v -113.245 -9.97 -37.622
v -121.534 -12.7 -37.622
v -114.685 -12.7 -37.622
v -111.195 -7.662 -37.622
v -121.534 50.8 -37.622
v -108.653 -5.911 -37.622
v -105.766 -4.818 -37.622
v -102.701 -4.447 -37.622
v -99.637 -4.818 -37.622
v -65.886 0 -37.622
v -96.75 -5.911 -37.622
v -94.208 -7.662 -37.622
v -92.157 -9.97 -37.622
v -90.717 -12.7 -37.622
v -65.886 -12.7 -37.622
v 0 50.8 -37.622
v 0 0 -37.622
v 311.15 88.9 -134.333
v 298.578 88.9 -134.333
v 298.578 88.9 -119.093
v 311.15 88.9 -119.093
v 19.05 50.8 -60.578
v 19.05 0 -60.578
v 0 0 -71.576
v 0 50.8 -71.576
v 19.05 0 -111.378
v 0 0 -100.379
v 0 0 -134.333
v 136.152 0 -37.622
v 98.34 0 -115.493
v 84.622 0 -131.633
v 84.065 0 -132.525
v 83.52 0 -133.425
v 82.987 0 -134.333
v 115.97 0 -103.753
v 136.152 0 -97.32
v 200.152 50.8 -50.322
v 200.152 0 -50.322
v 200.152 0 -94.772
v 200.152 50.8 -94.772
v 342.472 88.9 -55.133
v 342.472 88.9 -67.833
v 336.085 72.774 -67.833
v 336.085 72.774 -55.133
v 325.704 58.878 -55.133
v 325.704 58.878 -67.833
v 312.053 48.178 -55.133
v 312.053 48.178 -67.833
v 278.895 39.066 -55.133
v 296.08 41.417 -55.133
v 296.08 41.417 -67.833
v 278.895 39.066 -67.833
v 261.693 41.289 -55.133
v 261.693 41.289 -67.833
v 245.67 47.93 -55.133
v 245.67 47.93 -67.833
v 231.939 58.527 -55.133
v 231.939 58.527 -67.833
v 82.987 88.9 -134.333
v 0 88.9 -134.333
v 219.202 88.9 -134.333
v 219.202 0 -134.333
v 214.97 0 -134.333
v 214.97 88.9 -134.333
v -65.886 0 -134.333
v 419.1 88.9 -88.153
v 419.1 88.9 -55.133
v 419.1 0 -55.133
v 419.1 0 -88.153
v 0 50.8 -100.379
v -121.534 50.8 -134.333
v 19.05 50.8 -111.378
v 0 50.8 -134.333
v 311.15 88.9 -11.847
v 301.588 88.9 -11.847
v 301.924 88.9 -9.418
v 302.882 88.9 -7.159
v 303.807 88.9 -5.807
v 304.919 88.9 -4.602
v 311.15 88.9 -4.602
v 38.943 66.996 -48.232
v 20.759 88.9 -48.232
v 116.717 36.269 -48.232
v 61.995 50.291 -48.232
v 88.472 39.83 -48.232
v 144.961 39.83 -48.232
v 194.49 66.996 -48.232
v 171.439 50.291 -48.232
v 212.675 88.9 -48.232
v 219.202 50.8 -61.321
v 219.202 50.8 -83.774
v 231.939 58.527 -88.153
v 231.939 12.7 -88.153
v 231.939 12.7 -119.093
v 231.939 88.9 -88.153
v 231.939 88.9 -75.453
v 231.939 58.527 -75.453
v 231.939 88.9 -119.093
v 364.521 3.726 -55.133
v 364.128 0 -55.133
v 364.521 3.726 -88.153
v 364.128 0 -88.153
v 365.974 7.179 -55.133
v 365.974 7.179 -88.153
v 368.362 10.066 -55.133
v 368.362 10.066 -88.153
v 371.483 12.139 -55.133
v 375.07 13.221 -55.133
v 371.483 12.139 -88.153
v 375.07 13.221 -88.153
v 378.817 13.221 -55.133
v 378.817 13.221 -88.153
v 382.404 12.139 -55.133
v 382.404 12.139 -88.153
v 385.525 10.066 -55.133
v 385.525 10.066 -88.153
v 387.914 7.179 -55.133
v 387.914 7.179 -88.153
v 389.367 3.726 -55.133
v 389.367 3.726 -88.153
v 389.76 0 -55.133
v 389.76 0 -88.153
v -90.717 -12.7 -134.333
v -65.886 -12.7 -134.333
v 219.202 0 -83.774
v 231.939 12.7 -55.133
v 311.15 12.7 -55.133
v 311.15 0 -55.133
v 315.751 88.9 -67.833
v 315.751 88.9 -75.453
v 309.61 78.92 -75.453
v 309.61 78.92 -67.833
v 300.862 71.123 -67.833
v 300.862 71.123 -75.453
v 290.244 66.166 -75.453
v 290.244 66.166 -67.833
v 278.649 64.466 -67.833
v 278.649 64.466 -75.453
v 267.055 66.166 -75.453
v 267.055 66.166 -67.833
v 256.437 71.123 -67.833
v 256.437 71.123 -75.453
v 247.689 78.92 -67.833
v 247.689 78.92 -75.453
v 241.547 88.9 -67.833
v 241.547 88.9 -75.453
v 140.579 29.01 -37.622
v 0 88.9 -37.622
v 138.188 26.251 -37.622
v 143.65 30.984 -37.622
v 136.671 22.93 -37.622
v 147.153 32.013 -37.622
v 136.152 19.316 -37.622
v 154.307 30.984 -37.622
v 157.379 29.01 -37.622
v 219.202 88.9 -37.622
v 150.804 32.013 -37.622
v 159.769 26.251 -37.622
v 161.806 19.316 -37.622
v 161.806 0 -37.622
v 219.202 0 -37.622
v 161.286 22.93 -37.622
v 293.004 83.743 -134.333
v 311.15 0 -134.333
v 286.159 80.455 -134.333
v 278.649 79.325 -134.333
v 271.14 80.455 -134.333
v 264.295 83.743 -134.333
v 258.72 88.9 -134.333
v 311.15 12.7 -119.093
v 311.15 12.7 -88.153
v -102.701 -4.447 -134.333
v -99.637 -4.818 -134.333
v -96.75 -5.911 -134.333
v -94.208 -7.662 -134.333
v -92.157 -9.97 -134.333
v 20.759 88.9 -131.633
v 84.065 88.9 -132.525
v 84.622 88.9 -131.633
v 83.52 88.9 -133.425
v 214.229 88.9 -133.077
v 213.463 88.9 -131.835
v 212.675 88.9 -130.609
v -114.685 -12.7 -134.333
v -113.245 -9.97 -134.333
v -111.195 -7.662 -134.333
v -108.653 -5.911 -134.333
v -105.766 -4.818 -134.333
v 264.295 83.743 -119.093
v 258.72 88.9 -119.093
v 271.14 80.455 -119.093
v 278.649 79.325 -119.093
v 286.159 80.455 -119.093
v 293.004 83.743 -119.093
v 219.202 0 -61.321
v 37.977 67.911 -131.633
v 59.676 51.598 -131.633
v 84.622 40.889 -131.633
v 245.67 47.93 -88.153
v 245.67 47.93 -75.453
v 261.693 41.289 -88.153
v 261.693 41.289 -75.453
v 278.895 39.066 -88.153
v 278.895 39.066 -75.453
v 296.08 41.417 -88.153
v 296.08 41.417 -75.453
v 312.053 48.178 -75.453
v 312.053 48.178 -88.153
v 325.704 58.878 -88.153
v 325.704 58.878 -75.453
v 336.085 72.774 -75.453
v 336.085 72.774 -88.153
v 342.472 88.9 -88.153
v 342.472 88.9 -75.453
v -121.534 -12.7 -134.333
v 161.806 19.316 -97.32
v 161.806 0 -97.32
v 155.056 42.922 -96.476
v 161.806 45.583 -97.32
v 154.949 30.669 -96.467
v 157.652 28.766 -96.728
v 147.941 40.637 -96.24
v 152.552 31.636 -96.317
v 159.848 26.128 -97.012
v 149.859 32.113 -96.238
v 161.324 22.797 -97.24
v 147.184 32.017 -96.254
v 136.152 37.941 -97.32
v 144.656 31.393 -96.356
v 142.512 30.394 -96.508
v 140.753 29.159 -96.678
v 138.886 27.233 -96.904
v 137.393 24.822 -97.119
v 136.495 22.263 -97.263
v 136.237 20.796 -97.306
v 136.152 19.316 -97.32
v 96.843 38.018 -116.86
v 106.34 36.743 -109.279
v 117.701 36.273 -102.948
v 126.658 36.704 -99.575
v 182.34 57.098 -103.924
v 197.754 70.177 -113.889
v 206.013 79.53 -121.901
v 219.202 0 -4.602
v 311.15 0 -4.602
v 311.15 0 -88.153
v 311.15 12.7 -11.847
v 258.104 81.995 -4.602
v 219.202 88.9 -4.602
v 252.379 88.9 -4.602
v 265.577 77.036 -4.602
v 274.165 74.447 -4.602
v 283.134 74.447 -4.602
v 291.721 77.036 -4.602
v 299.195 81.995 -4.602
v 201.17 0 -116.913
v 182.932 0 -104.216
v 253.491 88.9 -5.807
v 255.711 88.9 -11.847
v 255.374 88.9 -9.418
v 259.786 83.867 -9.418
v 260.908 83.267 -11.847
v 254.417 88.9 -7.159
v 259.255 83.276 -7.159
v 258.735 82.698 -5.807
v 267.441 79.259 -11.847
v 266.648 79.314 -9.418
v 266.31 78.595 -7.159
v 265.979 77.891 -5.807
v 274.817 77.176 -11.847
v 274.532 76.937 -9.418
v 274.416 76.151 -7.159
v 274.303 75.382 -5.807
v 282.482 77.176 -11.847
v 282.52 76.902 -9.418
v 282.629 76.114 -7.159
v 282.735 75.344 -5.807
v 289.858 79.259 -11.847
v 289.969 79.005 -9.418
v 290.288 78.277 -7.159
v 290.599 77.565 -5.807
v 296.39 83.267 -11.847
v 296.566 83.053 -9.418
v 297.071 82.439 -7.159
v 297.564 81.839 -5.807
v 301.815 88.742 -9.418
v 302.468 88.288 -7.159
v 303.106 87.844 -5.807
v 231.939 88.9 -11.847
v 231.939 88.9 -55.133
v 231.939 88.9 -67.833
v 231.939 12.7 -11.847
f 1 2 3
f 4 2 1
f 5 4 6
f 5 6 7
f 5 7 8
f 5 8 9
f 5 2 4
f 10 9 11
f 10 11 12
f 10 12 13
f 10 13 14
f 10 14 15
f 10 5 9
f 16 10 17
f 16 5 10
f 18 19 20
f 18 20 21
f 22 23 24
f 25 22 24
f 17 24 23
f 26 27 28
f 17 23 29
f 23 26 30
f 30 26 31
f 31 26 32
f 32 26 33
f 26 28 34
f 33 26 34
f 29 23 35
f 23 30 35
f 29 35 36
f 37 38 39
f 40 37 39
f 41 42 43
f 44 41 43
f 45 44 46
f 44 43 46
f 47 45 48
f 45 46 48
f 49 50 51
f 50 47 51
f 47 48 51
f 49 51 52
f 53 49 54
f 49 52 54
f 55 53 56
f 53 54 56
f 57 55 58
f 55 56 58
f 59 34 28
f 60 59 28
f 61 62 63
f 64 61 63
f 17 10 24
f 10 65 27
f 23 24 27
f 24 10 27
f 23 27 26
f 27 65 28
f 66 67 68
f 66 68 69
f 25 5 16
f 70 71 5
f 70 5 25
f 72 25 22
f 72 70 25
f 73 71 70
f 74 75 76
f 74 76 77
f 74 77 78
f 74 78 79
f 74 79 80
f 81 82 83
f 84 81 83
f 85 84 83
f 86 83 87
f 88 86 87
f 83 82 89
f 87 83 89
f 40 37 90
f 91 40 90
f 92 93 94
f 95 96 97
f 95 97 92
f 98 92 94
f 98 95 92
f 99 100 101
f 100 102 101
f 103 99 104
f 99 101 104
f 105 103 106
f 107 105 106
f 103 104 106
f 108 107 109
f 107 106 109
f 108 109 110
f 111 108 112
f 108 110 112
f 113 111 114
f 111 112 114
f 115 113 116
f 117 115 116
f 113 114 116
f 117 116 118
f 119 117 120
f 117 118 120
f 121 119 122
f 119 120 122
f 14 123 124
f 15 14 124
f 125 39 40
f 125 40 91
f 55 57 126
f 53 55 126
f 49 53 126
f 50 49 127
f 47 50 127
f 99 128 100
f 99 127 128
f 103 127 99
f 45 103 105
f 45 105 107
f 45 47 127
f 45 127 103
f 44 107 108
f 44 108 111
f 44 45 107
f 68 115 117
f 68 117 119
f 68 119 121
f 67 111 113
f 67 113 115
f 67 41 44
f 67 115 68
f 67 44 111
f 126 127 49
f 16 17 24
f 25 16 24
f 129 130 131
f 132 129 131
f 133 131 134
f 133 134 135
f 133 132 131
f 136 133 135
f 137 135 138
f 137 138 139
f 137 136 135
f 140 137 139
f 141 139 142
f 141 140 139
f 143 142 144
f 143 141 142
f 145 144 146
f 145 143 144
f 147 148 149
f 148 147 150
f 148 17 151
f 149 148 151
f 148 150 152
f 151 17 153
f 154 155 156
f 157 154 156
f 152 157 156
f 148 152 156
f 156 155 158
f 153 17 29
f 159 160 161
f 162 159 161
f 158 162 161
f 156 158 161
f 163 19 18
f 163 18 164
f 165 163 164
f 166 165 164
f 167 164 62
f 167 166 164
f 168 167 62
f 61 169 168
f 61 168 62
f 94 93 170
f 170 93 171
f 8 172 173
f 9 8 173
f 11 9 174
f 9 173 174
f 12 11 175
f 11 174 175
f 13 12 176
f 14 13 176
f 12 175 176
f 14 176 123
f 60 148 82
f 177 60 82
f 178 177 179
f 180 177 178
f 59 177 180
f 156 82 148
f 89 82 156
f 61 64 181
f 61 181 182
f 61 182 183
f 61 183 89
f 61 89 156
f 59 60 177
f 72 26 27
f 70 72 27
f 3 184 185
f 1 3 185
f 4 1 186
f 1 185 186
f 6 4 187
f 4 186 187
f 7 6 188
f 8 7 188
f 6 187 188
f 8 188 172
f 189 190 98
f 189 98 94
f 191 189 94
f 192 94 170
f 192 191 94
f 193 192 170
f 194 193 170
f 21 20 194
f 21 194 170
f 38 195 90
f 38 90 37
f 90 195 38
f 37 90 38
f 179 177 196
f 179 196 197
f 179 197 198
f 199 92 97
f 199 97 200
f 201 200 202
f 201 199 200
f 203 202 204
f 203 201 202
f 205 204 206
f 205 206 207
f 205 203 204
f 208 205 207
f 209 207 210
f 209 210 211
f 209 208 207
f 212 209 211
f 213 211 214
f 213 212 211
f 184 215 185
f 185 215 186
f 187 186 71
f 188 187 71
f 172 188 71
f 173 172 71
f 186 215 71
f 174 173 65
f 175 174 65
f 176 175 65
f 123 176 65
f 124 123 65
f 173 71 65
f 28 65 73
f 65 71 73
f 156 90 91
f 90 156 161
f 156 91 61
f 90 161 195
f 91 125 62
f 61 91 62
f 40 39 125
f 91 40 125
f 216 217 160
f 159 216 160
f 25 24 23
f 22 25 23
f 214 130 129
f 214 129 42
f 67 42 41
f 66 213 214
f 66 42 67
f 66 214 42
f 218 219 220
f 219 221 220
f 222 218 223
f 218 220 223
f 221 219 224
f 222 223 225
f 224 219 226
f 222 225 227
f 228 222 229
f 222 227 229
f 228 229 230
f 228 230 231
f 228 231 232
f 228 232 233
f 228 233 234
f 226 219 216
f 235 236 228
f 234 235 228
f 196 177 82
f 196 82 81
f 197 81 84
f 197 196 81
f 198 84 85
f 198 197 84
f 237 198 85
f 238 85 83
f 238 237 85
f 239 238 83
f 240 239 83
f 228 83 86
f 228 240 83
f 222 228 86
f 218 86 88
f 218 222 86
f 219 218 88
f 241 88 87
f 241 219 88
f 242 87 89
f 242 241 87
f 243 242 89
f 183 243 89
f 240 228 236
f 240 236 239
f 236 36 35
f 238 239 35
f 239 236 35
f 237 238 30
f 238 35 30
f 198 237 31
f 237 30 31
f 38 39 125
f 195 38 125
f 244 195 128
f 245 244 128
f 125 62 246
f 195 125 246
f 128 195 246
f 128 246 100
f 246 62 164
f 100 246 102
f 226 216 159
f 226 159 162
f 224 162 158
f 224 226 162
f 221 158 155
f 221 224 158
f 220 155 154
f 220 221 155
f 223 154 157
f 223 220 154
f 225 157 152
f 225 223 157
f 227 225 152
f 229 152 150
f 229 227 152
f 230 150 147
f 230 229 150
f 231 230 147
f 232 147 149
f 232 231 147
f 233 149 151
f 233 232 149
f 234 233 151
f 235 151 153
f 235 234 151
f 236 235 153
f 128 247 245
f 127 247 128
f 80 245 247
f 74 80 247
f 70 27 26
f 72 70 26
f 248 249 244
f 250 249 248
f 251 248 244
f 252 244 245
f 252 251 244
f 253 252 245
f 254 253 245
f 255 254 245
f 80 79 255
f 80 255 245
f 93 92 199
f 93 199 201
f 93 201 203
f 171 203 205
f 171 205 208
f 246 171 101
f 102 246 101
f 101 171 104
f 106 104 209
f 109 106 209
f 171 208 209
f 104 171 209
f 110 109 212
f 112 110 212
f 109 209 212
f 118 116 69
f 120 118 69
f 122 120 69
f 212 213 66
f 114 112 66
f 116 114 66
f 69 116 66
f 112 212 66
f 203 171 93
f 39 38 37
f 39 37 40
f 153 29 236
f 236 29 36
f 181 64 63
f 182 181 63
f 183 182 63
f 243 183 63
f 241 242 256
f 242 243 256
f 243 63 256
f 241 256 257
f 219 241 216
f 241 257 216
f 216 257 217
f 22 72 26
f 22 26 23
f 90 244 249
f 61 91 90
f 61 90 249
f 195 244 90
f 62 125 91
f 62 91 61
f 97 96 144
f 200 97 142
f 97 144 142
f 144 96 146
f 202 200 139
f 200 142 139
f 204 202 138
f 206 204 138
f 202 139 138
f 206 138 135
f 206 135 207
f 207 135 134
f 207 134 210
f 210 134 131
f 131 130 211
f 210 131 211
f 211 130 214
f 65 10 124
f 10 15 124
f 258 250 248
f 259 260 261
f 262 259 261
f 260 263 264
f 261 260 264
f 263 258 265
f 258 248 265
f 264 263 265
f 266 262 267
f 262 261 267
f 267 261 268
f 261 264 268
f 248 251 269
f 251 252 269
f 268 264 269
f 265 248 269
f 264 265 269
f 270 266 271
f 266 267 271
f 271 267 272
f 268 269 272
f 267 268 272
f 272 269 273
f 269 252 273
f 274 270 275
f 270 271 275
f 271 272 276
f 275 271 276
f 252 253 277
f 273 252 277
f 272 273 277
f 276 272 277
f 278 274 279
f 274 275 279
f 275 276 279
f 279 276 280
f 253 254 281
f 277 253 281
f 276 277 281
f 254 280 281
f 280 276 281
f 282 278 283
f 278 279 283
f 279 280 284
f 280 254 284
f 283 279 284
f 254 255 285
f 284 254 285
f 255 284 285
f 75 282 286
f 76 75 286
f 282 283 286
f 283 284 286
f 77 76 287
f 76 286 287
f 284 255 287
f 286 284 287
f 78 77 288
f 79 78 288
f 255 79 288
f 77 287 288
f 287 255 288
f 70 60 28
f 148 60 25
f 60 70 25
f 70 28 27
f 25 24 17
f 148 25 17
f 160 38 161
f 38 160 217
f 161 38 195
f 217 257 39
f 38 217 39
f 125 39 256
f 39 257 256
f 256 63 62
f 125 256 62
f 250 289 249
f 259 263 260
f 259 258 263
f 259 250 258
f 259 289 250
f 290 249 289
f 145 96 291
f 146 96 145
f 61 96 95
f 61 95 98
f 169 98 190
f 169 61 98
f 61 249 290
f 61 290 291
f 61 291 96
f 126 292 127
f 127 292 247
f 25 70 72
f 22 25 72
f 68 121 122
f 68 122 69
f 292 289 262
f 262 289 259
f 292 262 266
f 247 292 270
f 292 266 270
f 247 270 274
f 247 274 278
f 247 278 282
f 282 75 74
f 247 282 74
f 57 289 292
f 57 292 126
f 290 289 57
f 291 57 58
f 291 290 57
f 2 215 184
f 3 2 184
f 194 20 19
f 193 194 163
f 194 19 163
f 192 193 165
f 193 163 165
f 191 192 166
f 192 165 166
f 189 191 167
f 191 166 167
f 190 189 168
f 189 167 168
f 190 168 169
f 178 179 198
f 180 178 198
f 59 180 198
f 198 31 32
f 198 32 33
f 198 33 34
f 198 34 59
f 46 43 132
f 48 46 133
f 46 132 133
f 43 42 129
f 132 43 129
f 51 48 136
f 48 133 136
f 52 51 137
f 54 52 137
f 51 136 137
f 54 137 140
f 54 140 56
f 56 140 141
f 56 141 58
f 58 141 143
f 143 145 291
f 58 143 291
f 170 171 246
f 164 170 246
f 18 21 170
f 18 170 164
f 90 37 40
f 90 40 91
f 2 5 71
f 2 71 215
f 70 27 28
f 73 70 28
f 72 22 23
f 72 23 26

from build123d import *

# Parameters (mm, degrees)
SKETCH1_W           = 419.1
SKETCH1_H           = 142.18412
BOSS_EXTRUDE1_DEPTH = 88.9
SKETCH2_R           = 119.38
CUT_EXTRUDE1_DEPTH  = 83.4009
SKETCH7_W           = 187.160719179
SKETCH7_H           = 30.93974
SKETCH7_H_2         = 43.28668
CUT_EXTRUDE2_DEPTH  = 452.402640644
SKETCH4_R           = 40.386
CUT_EXTRUDE4_DEPTH  = 7.62
CUT_EXTRUDE17_START = -12.7
CUT_EXTRUDE17_DEPTH = 12.7
CUT_EXTRUDE18_DEPTH = 12.7
SKETCH18_R          = 25.527
CUT_EXTRUDE11_DEPTH = 23.09114
SKETCH8_W           = 419.1
SKETCH8_H           = 88.9
CUT_EXTRUDE6_DEPTH  = 7.85114
SKETCH9_W           = 419.1
SKETCH9_H           = 88.9
CUT_EXTRUDE7_DEPTH  = 7.14248
SKETCH10_W          = 219.202
SKETCH10_H          = 88.9
CUT_EXTRUDE8_DEPTH  = 30.48
SKETCH12_W          = 121.533574186
SKETCH12_H          = 96.7105
BOSS_EXTRUDE2_DEPTH = 50.8
SKETCH14_W          = 55.647095764
SKETCH14_H          = 96.7105
BOSS_EXTRUDE3_DEPTH = 12.7
CUT_EXTRUDE10_REACH = 448.907
SKETCH17_R          = 12.827
SKETCH22_W          = 199.898
SKETCH22_H          = 88.9
BOSS_EXTRUDE5_DEPTH = 2.54
SKETCH29_R          = 12.827
CUT_EXTRUDE14_DEPTH = 447.906526346
BOSS_EXTRUDE6_DEPTH = 86.10092
SKETCH45_W          = 107.95
SKETCH45_H          = 50.53076
SKETCH45_H_2        = 15.24
CUT_EXTRUDE22_DEPTH = 452.677672269
SKETCH46_W          = 91.948
SKETCH46_H          = 129.7305
BOSS_EXTRUDE7_DEPTH = 12.7
CUT_EXTRUDE23_DEPTH = 452.677672176
SPLIT1_DEPTH        = 50.8
SPLIT1_START        = -4.447045482
SPLIT1_2_OUTLINE_W  = 55.647095764
SPLIT1_2_OUTLINE_H  = 96.7105
SPLIT1_2_DEPTH      = 4.447045482
SPLIT1_START_2      = -134.33298
SPLIT1_3_DEPTH      = 96.7105
SPLIT1_START_3      = -12.7
SPLIT1_4_DEPTH      = 63.5
SPLIT3_DEPTH        = 88.9
SPLIT3_START        = 50.8
SPLIT3_2_OUTLINE_W  = 25.654
SPLIT3_2_OUTLINE_H  = 10.60958
SPLIT3_2_DEPTH      = 38.1
SPLIT3_START_2      = 19.31637732
SPLIT3_3_DEPTH      = 31.48362268
SPLIT3_START_3      = -131.63296
SPLIT3_4_DEPTH      = 83.4009
SPLIT3_START_4      = -48.23206
SPLIT3_5_DEPTH      = 10.60958
SPLIT3_6_DEPTH      = 88.9
SPLIT3_7_DEPTH      = 38.1


with BuildPart() as part:
    # Sketch1 → Boss-Extrude1 (new body)
    with BuildSketch(Plane(origin=(0, 0, 0), x_dir=(1, 0, 0), z_dir=(0, 1, 0))):
        with Locations((209.55, 71.09206)):
            Rectangle(SKETCH1_W, SKETCH1_H)
    extrude(amount=BOSS_EXTRUDE1_DEPTH)

    # Sketch2 → Cut-Extrude1 (cut)
    with BuildSketch(Plane(origin=(0, 0, -131.63296), x_dir=(-1, 0, 0), z_dir=(0, 0, -1))):
        with Locations((-116.7166499, 150.061217688)):
            Circle(SKETCH2_R)
    extrude(amount=-CUT_EXTRUDE1_DEPTH, mode=Mode.SUBTRACT)

    # Sketch7 → Cut-Extrude2 (cut, through all)
    with BuildSketch(Plane(origin=(0, 88.9, 0), x_dir=(1, 0, 0), z_dir=(0, 1, 0))):
        with Locations((325.519640411, 103.62311)):
            Rectangle(SKETCH7_W, SKETCH7_H)
        with Locations((325.519640411, 33.4899)):
            Rectangle(SKETCH7_W, SKETCH7_H_2)
    extrude(amount=-CUT_EXTRUDE2_DEPTH, mode=Mode.SUBTRACT)

    # Sketch4 → Cut-Extrude4 (cut)
    with BuildSketch(Plane(origin=(0, 0, -67.83324), x_dir=(-1, 0, 0), z_dir=(0, 0, -1))):
        with Locations((-278.649352085, 104.852009966)):
            Circle(SKETCH4_R)
    extrude(amount=CUT_EXTRUDE4_DEPTH, mode=Mode.SUBTRACT)

    # Sketch39 → Cut-Extrude17 (cut)
    with BuildSketch(Plane.XY.offset(-55.13324).offset(CUT_EXTRUDE17_START)):
        with BuildLine():
            Line((231.939280821, 58.527426444), (231.939280821, 88.9))
            Line((231.939280821, 88.9), (342.472006166, 88.9))
            ThreePointArc((342.472006166, 88.9), (296.080170447, 41.417284719), (231.939280821, 58.527426444))
        make_face()
    extrude(amount=CUT_EXTRUDE17_DEPTH, mode=Mode.SUBTRACT)

    # Sketch40 → Cut-Extrude18 (cut)
    with BuildSketch(Plane(origin=(0, 0, -88.15324), x_dir=(-1, 0, 0), z_dir=(0, 0, -1))):
        with BuildLine():
            Line((-231.939280821, 88.9), (-231.939280821, 58.527426444))
            ThreePointArc((-231.939280821, 58.527426444), (-296.080170447, 41.417284719), (-342.472006166, 88.9))
            Line((-342.472006166, 88.9), (-231.939280821, 88.9))
        make_face()
    extrude(amount=-CUT_EXTRUDE18_DEPTH, mode=Mode.SUBTRACT)

    # Sketch18 → Cut-Extrude11 (cut)
    with BuildSketch(Plane(origin=(0, 0, -142.18412), x_dir=(-1, 0, 0), z_dir=(0, 0, -1))):
        with Locations((-278.649352085, 104.852009966)):
            Circle(SKETCH18_R)
    extrude(amount=-CUT_EXTRUDE11_DEPTH, mode=Mode.SUBTRACT)

    # Sketch8 → Cut-Extrude6 (cut)
    with BuildSketch(Plane(origin=(0, 0, -142.18412), x_dir=(-1, 0, 0), z_dir=(0, 0, -1))):
        with Locations((-209.55, 44.45)):
            Rectangle(SKETCH8_W, SKETCH8_H)
    extrude(amount=-CUT_EXTRUDE6_DEPTH, mode=Mode.SUBTRACT)

    # Sketch9 → Cut-Extrude7 (cut)
    with BuildSketch(Plane.XY):
        with Locations((209.55, 44.45)):
            Rectangle(SKETCH9_W, SKETCH9_H)
    extrude(amount=-CUT_EXTRUDE7_DEPTH, mode=Mode.SUBTRACT)

    # Sketch10 → Cut-Extrude8 (cut)
    with BuildSketch(Plane.XY.offset(-7.14248)):
        with Locations((109.601, 44.45)):
            Rectangle(SKETCH10_W, SKETCH10_H)
    extrude(amount=-CUT_EXTRUDE8_DEPTH, mode=Mode.SUBTRACT)

    # Sketch12 → Boss-Extrude2 (add)
    with BuildSketch(Plane.XZ):
        with Locations((-60.766787093, -85.97773)):
            Rectangle(SKETCH12_W, SKETCH12_H)
    extrude(amount=-BOSS_EXTRUDE2_DEPTH)

    # Sketch14 → Boss-Extrude3 (add)
    with BuildSketch(Plane.XZ):
        with Locations((-93.710026304, -85.97773)):
            Rectangle(SKETCH14_W, SKETCH14_H)
    extrude(amount=BOSS_EXTRUDE3_DEPTH)

    # Cut-Extrude10: up to this face of the body (flat: up to its plane)
    cut_extrude10_end = Plane(part.part.faces().sort_by_distance((319.151, 44.45, -7.14248))[0])
    # Sketch17 → Cut-Extrude10 (cut, up to the picked face)
    with BuildSketch(Plane(origin=(0, 0, -134.33298), x_dir=(-1, 0, 0), z_dir=(0, 0, -1)), mode=Mode.PRIVATE) as cut_extrude10_sk1:
        with Locations((-376.94362, 0.531880938)):
            Circle(SKETCH17_R)
    cut_extrude10_tool1 = split(extrude(cut_extrude10_sk1.sketch, amount=-CUT_EXTRUDE10_REACH, mode=Mode.PRIVATE), bisect_by=cut_extrude10_end, keep=Keep.BOTH, mode=Mode.PRIVATE)
    # Sketch17 → Cut-Extrude10 (cut, up to the picked face)
    with BuildSketch(Plane(origin=(0, 0, -134.33298), x_dir=(-1, 0, 0), z_dir=(0, 0, -1)), mode=Mode.PRIVATE) as cut_extrude10_sk2:
        with Locations((102.701238422, -17.274045482)):
            Circle(SKETCH17_R)
    cut_extrude10_tool2 = split(extrude(cut_extrude10_sk2.sketch, amount=-CUT_EXTRUDE10_REACH, mode=Mode.PRIVATE), bisect_by=cut_extrude10_end, keep=Keep.BOTH, mode=Mode.PRIVATE)
    # Sketch17 → Cut-Extrude10 (cut, up to the picked face)
    with BuildSketch(Plane(origin=(0, 0, -134.33298), x_dir=(-1, 0, 0), z_dir=(0, 0, -1)), mode=Mode.PRIVATE) as cut_extrude10_sk3:
        with BuildLine():
            Line((-161.80562, 19.31637742), (-161.80562, 0))
            Line((-161.80562, 0), (-136.15162, 0))
            Line((-136.15162, 0), (-136.15162, 19.31637742))
            ThreePointArc((-136.15162, 19.31637742), (-148.97862, 32.14337742), (-161.80562, 19.31637742))
        make_face()
    cut_extrude10_tool3 = split(extrude(cut_extrude10_sk3.sketch, amount=-CUT_EXTRUDE10_REACH, mode=Mode.PRIVATE), bisect_by=cut_extrude10_end, keep=Keep.BOTH, mode=Mode.PRIVATE)
    add(cut_extrude10_tool1.solids().sort_by(Axis((376.94362, 0.531881, -134.33298), (0, 0, 1)))[0], mode=Mode.SUBTRACT)
    add(cut_extrude10_tool2.solids().sort_by(Axis((-102.701238, -17.274045, -134.33298), (0, 0, 1)))[0], mode=Mode.SUBTRACT)
    add(cut_extrude10_tool3.solids().sort_by(Axis((148.97862, 14.834778, -134.33298), (0, 0, 1)))[0], mode=Mode.SUBTRACT)

    # Sketch22 → Boss-Extrude5 (add)
    with BuildSketch(Plane.XY.offset(-7.14248)):
        with Locations((319.151, 44.45)):
            Rectangle(SKETCH22_W, SKETCH22_H)
    extrude(amount=BOSS_EXTRUDE5_DEPTH)

    # Sketch29 → Cut-Extrude14 (cut, through all)
    with BuildSketch(Plane(origin=(0, 0, -7.14248), x_dir=(-1, 0, 0), z_dir=(0, 0, -1))):
        with Locations((-376.94362, 0.531880938)):
            Circle(SKETCH29_R)
    extrude(amount=-CUT_EXTRUDE14_DEPTH, mode=Mode.SUBTRACT)

    # Sketch30 → Boss-Extrude6 (add)
    with BuildSketch(Plane(origin=(0, 0, -134.33298), x_dir=(-1, 0, 0), z_dir=(0, 0, -1))):
        with BuildLine():
            Line((-14.194018979, 88.9), (-20.758717893, 88.9))
            ThreePointArc((-20.758717893, 88.9), (-116.7166499, 36.269217688), (-212.674581906, 88.9))
            Line((-212.674581906, 88.9), (-219.239280821, 88.9))
            ThreePointArc((-219.239280821, 88.9), (-116.7166499, 30.681217688), (-14.194018979, 88.9))
        make_face()
    extrude(amount=-BOSS_EXTRUDE6_DEPTH)

    # Sketch44 → Cut-Revolve1 (revolve, cut)
    with BuildSketch(Plane(origin=(0, 104.852009966, 0), x_dir=(1, 0, 0), z_dir=(0, 1, 0))):
        with BuildLine():
            Line((278.649352085, 11.84656), (306.589352085, 11.84656))
            ThreePointArc((306.589352085, 11.84656), (307.31205993, 7.964449393), (309.383352085, 4.60248))
            Line((309.383352085, 4.60248), (278.649352085, 4.60248))
            Line((278.649352085, 4.60248), (278.649352085, 11.84656))
        make_face()
    revolve(axis=Axis((278.649352085, 104.852009966, -328.456473898), (0, 0, 1)), mode=Mode.SUBTRACT)

    # Sketch45 → Cut-Extrude22 (cut, through all)
    with BuildSketch(Plane(origin=(0, 88.9, 0), x_dir=(1, 0, 0), z_dir=(0, 1, 0))):
        with Locations((365.125, 29.86786)):
            Rectangle(SKETCH45_W, SKETCH45_H)
        with Locations((365.125, 126.71298)):
            Rectangle(SKETCH45_W, SKETCH45_H_2)
    extrude(amount=-CUT_EXTRUDE22_DEPTH, mode=Mode.SUBTRACT)

    # Sketch46 → Boss-Extrude7 (add)
    with BuildSketch(Plane.XZ):
        with Locations((265.176, -69.46773)):
            Rectangle(SKETCH46_W, SKETCH46_H)
    extrude(amount=-BOSS_EXTRUDE7_DEPTH)

    # Sketch47 → Cut-Extrude23 (cut, through all)
    with BuildSketch(Plane(origin=(0, 88.9, 0), x_dir=(1, 0, 0), z_dir=(0, 1, 0))):
        with BuildLine():
            Line((214.969755768, 134.33298), (82.987484232, 134.33298))
            ThreePointArc((82.987484232, 134.33298), (148.97862, 96.23298), (214.969755768, 134.33298))
        make_face()
    extrude(amount=-CUT_EXTRUDE23_DEPTH, mode=Mode.SUBTRACT)

    # Split1 4 outline → Split1 4 (cut)
    with BuildSketch(Plane(origin=(0, 0, 0), x_dir=(1, 0, 0), z_dir=(0, 1, 0)).offset(SPLIT1_START_3)):
        Polygon((0, 37.62248), (0, 71.576252628), (19.05, 60.57773), (19.05, 111.37773), (0, 100.379207372), (0, 134.33298), (-121.533574186, 134.33298), (-121.533574186, 37.62248), align=None)
    extrude(amount=SPLIT1_4_DEPTH, mode=Mode.SUBTRACT)

    # Split3 6 outline → Split3 6 (cut)
    with BuildSketch(Plane(origin=(0, 0, 0), x_dir=(1, 0, 0), z_dir=(0, 1, 0))):
        with BuildLine():
            Line((219.202, 37.62248), (219.202, 61.321002628))
            Line((219.202, 61.321002628), (200.152, 50.32248))
            Line((200.152, 50.32248), (200.152, 94.77248))
            Line((200.152, 94.77248), (219.202, 83.773957372))
            Line((219.202, 83.773957372), (219.202, 134.33298))
            Line((219.202, 134.33298), (214.969755768, 134.33298))
            ThreePointArc((214.969755768, 134.33298), (150.556684051, 96.249322213), (84.621814859, 131.63296))
            ThreePointArc((84.621814859, 131.63296), (83.790669029, 132.974507549), (82.987484232, 134.33298))
            Line((82.987484232, 134.33298), (0, 134.33298))
            Line((0, 134.33298), (0, 37.62248))
            Line((0, 37.62248), (219.202, 37.62248))
        make_face()
    extrude(amount=SPLIT3_6_DEPTH, mode=Mode.SUBTRACT)

    # Split3 7 outline → Split3 7 (cut)
    with BuildSketch(Plane(origin=(0, 0, 0), x_dir=(1, 0, 0), z_dir=(0, 1, 0)).offset(SPLIT3_START)):
        Polygon((200.152, 50.32248), (219.202, 61.321002628), (219.202, 83.773957372), (200.152, 94.77248), align=None)
    extrude(amount=SPLIT3_7_DEPTH, mode=Mode.SUBTRACT)


with BuildPart() as body_2:
    # Split1: read off the stored shape, not the designer's step
    # Split1 outline → Split1 (new body)
    with BuildSketch(Plane(origin=(0, 0, 0), x_dir=(1, 0, 0), z_dir=(0, 1, 0))):
        Polygon((19.05, 111.37773), (0, 100.379207372), (0, 134.33298), (-121.533574186, 134.33298), (-121.533574186, 37.62248), (0, 37.62248), (0, 71.576252628), (19.05, 60.57773), align=None)
    extrude(amount=SPLIT1_DEPTH)

    # Split1 2 outline → Split1 2 (add)
    with BuildSketch(Plane(origin=(0, 0, 0), x_dir=(1, 0, 0), z_dir=(0, 1, 0)).offset(SPLIT1_START)):
        with Locations((-93.710026304, 85.97773)):
            Rectangle(SPLIT1_2_OUTLINE_W, SPLIT1_2_OUTLINE_H)
    extrude(amount=SPLIT1_2_DEPTH)

    # Split1 3 outline → Split1 3 (add)
    with BuildSketch(Plane.XY.offset(SPLIT1_START_2)):
        with BuildLine():
            Line((-121.533574186, -4.447045482), (-121.533574186, -12.7))
            Line((-121.533574186, -12.7), (-114.684978945, -12.7))
            ThreePointArc((-114.684978945, -12.7), (-109.976561356, -6.709879391), (-102.701238422, -4.447045482))
            Line((-102.701238422, -4.447045482), (-121.533574186, -4.447045482))
        make_face()
        with BuildLine():
            Line((-65.886478422, -4.447045482), (-102.701238422, -4.447045482))
            ThreePointArc((-102.701238422, -4.447045482), (-95.425915488, -6.709879391), (-90.717497899, -12.7))
            Line((-90.717497899, -12.7), (-65.886478422, -12.7))
            Line((-65.886478422, -12.7), (-65.886478422, -4.447045482))
        make_face()
    extrude(amount=SPLIT1_3_DEPTH)


with BuildPart() as body_3:
    # Split3: read off the stored shape, not the designer's step
    # Split3 outline → Split3 (new body)
    with BuildSketch(Plane(origin=(0, 0, 0), x_dir=(1, 0, 0), z_dir=(0, 1, 0))):
        with BuildLine():
            Line((219.202, 83.773957372), (219.202, 134.33298))
            Line((219.202, 134.33298), (214.969755768, 134.33298))
            ThreePointArc((214.969755768, 134.33298), (192.516631386, 109.89593846), (161.80562, 97.320344106))
            Line((161.80562, 97.320344106), (161.80562, 48.23206))
            Line((161.80562, 48.23206), (161.80562, 37.62248))
            Line((161.80562, 37.62248), (219.202, 37.62248))
            Line((219.202, 37.62248), (219.202, 61.321002628))
            Line((219.202, 61.321002628), (200.152, 50.32248))
            Line((200.152, 50.32248), (200.152, 94.77248))
            Line((200.152, 94.77248), (219.202, 83.773957372))
        make_face()
        with BuildLine():
            Line((136.15162, 48.23206), (136.15162, 97.320344106))
            ThreePointArc((136.15162, 97.320344106), (106.745056968, 109.007699917), (84.621814859, 131.63296))
            ThreePointArc((84.621814859, 131.63296), (83.790669029, 132.974507549), (82.987484232, 134.33298))
            Line((82.987484232, 134.33298), (0, 134.33298))
            Line((0, 134.33298), (0, 100.379207372))
            Line((0, 100.379207372), (19.05, 111.37773))
            Line((19.05, 111.37773), (19.05, 60.57773))
            Line((19.05, 60.57773), (0, 71.576252628))
            Line((0, 71.576252628), (0, 37.62248))
            Line((0, 37.62248), (136.15162, 37.62248))
            Line((136.15162, 37.62248), (136.15162, 48.23206))
        make_face()
    extrude(amount=SPLIT3_DEPTH)

    # Split3 2 outline → Split3 2 (add)
    with BuildSketch(Plane(origin=(0, 0, 0), x_dir=(1, 0, 0), z_dir=(0, 1, 0)).offset(SPLIT3_START)):
        Polygon((219.202, 61.321002628), (219.202, 83.773957372), (200.152, 94.77248), (200.152, 50.32248), align=None)
        with Locations((148.97862, 42.92727)):
            Rectangle(SPLIT3_2_OUTLINE_W, SPLIT3_2_OUTLINE_H)
        Polygon((0, 100.379207372), (0, 71.576252628), (19.05, 60.57773), (19.05, 111.37773), align=None)
    extrude(amount=SPLIT3_2_DEPTH)

    # Split3 3 outline → Split3 3 (add)
    with BuildSketch(Plane(origin=(0, 0, 0), x_dir=(1, 0, 0), z_dir=(0, 1, 0)).offset(SPLIT3_START_2)):
        with BuildLine():
            ThreePointArc((161.80562, 97.320344106), (148.97862, 96.23298), (136.15162, 97.320344106))
            Line((136.15162, 97.320344106), (136.15162, 37.62248))
            Line((136.15162, 37.62248), (161.80562, 37.62248))
            Line((161.80562, 37.62248), (161.80562, 97.320344106))
        make_face()
    extrude(amount=SPLIT3_3_DEPTH)

    # Split3 4 outline → Split3 4 (cut)
    with BuildSketch(Plane.XY.offset(SPLIT3_START_3)):
        with BuildLine():
            ThreePointArc((161.80562, 19.31637742), (148.97862, 32.14337742), (136.15162, 19.31637742))
            Line((136.15162, 19.31637742), (161.80562, 19.31637742))
        make_face()
        with BuildLine():
            ThreePointArc((20.758717893, 88.9), (116.716649899, 36.269217688), (212.674581906, 88.9))
            Line((212.674581906, 88.9), (161.80562, 88.9))
            Line((161.80562, 88.9), (161.80562, 50.8))
            Line((161.80562, 50.8), (136.15162, 50.8))
            Line((136.15162, 50.8), (136.15162, 88.9))
            Line((136.15162, 88.9), (20.758717893, 88.9))
        make_face()
    extrude(amount=SPLIT3_4_DEPTH, mode=Mode.SUBTRACT)

    # Split3 5 outline → Split3 5 (cut)
    with BuildSketch(Plane.XY.offset(SPLIT3_START_4)):
        with BuildLine():
            ThreePointArc((161.80562, 19.31637742), (148.97862, 32.14337742), (136.15162, 19.31637742))
            Line((136.15162, 19.31637742), (161.80562, 19.31637742))
        make_face()
    extrude(amount=SPLIT3_5_DEPTH, mode=Mode.SUBTRACT)


solid = Compound([part.part, body_2.part, body_3.part])
